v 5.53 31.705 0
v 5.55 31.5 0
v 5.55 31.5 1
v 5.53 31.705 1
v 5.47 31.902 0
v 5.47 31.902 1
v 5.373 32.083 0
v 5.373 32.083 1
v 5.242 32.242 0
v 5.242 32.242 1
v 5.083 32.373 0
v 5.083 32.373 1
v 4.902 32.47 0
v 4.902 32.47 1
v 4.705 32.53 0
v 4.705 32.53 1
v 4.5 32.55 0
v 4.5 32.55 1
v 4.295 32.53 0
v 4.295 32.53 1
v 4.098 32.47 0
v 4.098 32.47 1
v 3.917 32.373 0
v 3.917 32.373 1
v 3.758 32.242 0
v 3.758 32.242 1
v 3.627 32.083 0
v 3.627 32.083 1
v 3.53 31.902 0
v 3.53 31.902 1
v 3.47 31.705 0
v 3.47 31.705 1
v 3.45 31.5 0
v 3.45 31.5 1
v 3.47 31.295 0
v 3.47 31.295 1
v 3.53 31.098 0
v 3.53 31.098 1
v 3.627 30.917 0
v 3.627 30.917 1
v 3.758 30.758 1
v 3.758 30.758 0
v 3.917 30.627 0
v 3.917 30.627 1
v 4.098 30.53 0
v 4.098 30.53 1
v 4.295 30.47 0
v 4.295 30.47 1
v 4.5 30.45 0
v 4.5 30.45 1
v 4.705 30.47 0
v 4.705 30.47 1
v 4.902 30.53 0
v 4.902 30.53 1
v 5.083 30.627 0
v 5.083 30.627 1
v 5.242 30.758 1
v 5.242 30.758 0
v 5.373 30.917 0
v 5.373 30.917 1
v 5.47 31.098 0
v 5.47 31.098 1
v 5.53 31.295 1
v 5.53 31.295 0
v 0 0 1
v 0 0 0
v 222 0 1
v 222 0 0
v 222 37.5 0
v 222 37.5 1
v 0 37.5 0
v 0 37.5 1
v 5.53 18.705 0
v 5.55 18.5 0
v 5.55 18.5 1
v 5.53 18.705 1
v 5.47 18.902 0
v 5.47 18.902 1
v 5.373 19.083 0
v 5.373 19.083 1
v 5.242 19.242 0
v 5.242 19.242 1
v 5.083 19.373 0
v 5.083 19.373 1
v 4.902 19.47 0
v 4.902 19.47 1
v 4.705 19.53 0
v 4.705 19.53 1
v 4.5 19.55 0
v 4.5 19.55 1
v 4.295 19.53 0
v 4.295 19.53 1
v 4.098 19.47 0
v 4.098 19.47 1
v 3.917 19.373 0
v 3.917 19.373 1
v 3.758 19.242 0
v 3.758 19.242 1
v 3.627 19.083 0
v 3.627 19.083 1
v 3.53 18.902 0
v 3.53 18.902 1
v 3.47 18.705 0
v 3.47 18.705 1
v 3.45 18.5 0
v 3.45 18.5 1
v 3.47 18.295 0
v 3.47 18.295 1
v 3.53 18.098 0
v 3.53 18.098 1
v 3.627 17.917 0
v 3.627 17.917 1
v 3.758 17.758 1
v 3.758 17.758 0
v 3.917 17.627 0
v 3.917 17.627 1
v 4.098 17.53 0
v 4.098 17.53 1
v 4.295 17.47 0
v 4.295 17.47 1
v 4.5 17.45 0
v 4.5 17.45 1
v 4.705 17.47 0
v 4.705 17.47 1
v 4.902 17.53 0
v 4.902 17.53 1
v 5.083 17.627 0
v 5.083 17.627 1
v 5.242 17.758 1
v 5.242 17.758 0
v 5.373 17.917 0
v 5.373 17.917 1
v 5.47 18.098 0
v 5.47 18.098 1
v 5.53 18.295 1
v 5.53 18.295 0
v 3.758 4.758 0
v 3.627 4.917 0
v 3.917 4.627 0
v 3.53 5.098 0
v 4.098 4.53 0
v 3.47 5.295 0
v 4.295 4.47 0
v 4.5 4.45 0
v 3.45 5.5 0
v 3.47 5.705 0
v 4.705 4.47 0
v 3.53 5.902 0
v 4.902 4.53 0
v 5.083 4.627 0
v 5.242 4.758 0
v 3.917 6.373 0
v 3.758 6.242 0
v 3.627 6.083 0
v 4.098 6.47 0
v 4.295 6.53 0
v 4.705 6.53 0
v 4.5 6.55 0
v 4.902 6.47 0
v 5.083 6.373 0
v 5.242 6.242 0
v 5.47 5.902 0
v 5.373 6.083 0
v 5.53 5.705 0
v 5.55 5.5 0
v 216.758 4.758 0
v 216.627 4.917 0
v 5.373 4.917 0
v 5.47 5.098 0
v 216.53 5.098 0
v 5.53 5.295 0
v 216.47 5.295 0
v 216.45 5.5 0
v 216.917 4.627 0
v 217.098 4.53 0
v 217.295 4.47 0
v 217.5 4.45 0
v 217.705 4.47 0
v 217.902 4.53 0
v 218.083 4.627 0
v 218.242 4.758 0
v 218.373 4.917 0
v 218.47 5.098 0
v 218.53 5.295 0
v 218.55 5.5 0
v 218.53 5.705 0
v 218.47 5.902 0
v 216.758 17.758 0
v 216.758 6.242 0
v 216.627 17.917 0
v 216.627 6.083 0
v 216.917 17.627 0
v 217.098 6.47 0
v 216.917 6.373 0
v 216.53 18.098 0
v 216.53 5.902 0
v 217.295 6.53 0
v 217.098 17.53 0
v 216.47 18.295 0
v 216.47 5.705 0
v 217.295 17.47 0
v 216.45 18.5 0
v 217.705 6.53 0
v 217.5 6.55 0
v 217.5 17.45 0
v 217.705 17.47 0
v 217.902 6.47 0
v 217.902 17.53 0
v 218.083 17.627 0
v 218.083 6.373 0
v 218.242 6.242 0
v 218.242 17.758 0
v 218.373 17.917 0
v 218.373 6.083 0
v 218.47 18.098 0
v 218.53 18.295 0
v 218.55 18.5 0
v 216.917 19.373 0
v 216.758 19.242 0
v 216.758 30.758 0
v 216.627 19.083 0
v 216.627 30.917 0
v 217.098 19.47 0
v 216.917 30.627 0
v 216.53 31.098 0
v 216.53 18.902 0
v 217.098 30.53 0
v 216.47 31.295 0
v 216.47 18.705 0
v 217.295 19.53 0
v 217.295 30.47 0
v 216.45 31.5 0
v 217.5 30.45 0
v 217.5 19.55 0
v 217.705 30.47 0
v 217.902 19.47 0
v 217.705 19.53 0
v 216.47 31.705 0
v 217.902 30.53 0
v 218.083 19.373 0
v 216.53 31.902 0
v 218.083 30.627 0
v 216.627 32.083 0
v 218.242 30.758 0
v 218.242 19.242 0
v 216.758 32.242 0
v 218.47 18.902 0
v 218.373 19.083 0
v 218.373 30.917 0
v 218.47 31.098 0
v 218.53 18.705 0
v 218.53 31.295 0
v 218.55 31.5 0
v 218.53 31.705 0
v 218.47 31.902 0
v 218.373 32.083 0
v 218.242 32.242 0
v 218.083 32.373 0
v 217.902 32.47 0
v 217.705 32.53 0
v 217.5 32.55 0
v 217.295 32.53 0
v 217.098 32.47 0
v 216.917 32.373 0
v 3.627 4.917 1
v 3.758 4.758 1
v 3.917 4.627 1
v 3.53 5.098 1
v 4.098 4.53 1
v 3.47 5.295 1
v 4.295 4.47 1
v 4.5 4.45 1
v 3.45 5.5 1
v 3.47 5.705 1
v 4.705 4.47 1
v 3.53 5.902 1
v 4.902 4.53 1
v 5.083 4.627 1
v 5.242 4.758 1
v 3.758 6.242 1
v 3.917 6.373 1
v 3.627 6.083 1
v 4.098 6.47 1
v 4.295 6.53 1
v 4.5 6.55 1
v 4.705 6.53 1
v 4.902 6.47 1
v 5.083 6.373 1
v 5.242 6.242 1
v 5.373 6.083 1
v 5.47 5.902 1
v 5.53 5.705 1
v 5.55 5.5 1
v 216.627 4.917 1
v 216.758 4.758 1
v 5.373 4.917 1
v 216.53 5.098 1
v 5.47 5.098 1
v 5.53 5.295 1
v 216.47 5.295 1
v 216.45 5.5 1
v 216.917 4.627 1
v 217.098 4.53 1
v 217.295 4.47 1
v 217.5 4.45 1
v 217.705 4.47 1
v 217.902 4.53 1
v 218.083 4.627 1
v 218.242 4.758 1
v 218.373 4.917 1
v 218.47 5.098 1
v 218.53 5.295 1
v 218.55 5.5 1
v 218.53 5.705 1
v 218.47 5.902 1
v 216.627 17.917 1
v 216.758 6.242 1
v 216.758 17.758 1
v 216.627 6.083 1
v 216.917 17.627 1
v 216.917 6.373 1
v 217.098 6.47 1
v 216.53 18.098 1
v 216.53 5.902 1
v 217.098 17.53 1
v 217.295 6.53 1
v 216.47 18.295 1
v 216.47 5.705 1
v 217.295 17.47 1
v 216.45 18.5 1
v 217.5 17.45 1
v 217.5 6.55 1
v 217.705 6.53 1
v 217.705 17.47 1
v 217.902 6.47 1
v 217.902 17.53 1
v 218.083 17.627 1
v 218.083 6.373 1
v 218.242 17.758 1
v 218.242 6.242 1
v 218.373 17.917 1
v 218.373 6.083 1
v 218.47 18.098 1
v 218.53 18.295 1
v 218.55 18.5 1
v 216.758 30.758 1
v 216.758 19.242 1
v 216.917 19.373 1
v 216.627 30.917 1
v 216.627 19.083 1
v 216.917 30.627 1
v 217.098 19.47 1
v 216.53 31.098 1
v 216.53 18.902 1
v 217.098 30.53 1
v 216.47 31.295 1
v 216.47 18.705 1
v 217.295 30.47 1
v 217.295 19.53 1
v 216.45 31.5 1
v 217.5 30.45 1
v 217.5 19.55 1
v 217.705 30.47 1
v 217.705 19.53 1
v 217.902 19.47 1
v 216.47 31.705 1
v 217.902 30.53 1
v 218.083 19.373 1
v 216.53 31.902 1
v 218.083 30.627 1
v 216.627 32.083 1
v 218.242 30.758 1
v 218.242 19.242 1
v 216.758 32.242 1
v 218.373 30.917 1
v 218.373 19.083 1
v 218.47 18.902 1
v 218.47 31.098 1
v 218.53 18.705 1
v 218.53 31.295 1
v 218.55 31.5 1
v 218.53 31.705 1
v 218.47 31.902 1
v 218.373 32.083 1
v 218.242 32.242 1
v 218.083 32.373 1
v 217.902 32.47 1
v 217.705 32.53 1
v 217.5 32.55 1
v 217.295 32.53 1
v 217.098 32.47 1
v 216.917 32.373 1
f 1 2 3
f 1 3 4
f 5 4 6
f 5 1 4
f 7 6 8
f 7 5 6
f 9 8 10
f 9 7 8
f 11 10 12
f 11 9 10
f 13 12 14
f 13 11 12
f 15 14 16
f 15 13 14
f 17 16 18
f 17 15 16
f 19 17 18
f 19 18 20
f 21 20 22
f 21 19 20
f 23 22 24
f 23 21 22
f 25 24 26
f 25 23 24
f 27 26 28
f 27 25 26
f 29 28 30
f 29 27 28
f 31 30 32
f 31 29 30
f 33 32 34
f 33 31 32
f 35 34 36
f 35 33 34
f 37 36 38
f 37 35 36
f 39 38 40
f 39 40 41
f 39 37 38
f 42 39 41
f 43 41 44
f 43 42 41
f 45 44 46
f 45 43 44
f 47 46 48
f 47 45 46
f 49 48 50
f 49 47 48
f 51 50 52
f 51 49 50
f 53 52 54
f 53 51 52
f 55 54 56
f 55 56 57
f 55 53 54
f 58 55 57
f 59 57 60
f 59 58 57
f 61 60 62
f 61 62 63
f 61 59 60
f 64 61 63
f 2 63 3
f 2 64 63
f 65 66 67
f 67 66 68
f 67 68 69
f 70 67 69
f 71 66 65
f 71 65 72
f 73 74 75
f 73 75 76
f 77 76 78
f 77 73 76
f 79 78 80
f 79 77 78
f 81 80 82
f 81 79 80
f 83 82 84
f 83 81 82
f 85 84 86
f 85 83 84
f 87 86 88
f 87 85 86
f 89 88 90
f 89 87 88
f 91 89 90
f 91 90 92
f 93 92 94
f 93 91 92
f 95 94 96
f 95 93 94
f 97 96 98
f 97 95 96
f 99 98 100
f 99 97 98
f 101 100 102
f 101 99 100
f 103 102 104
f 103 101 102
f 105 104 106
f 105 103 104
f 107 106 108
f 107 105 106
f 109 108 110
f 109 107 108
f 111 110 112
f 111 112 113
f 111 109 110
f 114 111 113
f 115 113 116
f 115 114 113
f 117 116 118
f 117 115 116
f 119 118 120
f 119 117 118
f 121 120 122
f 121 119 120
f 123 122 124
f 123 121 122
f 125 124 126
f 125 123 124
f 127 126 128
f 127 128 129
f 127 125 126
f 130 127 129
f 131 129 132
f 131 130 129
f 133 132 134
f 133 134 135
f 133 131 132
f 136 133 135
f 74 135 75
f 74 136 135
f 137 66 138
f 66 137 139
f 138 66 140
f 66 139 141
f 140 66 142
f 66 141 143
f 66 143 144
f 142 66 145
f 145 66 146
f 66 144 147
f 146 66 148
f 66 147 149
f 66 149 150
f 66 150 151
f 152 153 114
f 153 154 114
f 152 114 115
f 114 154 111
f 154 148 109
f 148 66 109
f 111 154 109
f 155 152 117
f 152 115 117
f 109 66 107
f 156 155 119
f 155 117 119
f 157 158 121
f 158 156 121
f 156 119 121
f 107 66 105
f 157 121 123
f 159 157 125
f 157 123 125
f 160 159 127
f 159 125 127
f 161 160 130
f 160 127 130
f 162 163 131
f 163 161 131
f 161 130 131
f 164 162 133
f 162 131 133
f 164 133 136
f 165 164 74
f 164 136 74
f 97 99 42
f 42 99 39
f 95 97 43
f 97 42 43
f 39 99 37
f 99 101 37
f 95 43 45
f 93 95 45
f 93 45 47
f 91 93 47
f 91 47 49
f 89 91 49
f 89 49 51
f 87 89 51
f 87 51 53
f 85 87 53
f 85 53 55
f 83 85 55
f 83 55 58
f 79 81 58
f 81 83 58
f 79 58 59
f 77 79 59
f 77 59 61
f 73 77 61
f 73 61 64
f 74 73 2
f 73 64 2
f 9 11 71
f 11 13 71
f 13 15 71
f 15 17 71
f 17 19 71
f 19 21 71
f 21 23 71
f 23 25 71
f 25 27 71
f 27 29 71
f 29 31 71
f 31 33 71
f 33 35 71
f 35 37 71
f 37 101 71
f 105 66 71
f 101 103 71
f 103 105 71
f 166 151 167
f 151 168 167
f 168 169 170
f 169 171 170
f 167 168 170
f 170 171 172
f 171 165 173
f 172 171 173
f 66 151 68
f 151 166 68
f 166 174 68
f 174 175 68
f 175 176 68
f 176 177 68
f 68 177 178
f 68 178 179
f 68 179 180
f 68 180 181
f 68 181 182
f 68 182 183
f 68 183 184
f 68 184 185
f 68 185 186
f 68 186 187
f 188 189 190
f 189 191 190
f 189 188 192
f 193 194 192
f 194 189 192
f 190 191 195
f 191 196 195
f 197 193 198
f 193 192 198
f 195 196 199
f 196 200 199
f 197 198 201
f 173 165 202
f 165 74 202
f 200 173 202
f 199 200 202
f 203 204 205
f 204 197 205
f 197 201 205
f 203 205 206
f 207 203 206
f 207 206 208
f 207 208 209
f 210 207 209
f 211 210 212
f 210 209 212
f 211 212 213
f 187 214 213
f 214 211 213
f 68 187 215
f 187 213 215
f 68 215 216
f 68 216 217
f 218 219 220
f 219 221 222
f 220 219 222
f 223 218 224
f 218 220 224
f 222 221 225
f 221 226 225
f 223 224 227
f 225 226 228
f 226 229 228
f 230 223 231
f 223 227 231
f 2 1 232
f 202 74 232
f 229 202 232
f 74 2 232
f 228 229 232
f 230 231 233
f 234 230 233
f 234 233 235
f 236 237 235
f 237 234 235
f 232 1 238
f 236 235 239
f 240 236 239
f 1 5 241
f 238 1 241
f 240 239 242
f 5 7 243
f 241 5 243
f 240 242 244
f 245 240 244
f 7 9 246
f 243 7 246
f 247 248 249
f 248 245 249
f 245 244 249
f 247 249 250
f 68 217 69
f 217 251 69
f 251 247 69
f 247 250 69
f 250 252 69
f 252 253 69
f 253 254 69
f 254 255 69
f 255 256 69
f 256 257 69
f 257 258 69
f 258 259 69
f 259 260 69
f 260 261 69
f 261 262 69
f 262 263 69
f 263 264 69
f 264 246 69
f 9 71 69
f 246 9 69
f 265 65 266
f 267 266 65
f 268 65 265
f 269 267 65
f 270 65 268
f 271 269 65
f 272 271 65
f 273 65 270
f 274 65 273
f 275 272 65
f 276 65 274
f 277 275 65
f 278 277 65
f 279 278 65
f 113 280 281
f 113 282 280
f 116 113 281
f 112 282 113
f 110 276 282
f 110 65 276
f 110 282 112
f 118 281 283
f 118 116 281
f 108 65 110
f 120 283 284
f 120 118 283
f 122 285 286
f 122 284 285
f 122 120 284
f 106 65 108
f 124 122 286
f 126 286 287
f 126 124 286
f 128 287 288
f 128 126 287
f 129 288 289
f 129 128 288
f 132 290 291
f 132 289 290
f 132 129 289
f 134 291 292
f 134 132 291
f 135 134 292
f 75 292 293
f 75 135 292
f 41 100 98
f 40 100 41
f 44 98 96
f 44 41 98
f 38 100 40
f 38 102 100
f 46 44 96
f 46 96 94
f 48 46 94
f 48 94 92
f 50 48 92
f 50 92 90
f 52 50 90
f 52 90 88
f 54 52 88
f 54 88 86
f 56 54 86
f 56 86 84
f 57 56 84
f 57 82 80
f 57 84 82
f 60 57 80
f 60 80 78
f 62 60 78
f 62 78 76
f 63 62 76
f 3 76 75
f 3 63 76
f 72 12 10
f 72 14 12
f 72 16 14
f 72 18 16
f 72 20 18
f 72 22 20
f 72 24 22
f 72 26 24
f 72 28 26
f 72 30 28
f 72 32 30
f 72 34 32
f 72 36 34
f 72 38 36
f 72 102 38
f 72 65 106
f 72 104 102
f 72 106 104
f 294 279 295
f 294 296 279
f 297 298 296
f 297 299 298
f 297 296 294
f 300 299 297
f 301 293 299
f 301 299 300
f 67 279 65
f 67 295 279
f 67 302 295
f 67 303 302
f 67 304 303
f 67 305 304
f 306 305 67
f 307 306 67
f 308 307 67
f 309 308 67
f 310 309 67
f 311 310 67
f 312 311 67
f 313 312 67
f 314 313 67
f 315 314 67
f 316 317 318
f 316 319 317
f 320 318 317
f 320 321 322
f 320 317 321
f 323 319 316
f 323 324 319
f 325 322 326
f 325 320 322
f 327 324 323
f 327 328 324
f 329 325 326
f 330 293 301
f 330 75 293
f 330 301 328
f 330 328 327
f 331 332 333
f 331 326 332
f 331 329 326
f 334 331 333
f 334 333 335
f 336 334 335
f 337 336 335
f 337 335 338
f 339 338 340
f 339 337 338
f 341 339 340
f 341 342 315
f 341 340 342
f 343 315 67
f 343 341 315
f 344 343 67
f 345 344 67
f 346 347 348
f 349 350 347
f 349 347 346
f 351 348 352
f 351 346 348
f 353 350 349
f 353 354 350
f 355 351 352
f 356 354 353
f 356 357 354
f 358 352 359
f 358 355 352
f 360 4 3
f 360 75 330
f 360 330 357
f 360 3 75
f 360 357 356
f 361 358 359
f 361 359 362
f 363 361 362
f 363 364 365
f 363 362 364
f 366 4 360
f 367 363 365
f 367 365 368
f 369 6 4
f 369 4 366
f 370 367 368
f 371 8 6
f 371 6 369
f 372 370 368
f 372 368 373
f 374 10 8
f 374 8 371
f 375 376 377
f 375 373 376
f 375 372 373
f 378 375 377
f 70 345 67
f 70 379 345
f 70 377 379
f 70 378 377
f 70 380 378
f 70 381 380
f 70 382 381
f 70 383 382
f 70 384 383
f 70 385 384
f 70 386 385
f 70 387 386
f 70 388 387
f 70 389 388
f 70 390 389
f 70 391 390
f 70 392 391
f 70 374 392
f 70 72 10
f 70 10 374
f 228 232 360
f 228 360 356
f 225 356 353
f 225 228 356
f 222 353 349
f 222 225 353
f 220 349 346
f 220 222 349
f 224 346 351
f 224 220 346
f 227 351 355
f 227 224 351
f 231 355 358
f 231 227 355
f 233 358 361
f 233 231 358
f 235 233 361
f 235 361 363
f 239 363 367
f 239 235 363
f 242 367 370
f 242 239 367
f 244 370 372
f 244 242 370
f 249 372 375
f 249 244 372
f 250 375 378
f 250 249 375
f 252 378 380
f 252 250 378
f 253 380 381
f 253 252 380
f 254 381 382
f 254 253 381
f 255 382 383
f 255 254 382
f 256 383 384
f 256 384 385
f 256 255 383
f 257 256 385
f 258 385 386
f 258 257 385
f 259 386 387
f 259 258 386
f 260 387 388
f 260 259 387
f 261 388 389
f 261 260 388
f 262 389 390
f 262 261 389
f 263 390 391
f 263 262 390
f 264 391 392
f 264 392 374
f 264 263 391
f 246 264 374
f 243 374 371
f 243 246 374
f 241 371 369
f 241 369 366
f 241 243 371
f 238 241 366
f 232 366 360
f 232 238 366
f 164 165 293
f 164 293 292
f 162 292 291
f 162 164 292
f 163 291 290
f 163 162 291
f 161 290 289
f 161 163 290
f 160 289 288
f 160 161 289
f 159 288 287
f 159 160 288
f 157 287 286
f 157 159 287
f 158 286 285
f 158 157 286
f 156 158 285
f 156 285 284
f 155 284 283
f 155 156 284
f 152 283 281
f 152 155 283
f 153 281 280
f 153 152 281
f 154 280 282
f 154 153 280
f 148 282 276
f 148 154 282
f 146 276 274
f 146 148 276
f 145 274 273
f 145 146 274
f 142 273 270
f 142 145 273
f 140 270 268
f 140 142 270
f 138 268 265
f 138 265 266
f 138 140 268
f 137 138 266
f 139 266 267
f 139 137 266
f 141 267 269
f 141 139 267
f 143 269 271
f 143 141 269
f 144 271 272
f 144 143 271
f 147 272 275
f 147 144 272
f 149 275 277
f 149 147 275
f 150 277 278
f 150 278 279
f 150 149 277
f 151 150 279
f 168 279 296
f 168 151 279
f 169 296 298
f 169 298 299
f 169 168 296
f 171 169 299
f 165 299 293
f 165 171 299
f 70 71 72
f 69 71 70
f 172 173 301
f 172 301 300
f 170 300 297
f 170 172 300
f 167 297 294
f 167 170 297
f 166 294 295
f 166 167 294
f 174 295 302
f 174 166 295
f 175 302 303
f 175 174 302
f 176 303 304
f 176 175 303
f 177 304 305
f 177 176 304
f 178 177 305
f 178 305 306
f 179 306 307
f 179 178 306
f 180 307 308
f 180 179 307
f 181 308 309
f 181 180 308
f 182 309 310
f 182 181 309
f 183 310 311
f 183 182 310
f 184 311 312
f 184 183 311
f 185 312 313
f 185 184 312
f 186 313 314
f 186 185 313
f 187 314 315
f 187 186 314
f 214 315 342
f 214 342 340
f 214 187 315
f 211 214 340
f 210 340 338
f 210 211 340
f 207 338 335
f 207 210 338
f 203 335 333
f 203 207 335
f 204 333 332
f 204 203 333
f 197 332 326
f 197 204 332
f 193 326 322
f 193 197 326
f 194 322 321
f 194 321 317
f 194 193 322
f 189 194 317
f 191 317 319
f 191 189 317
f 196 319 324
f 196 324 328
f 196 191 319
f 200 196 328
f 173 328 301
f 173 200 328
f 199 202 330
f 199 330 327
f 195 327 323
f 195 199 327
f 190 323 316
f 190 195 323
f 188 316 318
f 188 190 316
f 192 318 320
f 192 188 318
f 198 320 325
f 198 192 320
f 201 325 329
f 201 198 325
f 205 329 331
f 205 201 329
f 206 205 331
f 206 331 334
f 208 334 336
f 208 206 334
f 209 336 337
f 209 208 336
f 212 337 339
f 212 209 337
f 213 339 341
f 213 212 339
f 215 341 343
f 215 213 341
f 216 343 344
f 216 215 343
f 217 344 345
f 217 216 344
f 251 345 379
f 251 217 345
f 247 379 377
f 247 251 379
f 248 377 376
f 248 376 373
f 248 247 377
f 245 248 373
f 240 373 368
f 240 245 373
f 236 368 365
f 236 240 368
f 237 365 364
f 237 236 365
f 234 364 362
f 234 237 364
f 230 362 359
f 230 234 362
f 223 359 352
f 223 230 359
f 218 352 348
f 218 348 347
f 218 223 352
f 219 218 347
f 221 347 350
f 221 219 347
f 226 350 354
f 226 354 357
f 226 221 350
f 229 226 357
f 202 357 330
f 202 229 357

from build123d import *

# Parameters (mm, degrees)
SKETCH_1_W      = 222
SKETCH_1_H      = 37.5
SKETCH_1_R      = 1.05
EXTRUDE_1_DEPTH = 1


with BuildPart() as part:
    # Эскиз1 → Бобышка-Вытянуть1 (new body)
    with BuildSketch(Plane.XY):
        with Locations((111, 18.75)):
            Rectangle(SKETCH_1_W, SKETCH_1_H)
        with Locations((4.5, 31.5)):
            Circle(SKETCH_1_R, mode=Mode.SUBTRACT)
        with Locations((4.5, 18.5)):
            Circle(SKETCH_1_R, mode=Mode.SUBTRACT)
        with Locations((4.5, 5.5)):
            Circle(SKETCH_1_R, mode=Mode.SUBTRACT)
        with Locations(Location((217.5, 5.5, 0), (0, 0, 180))):
            Circle(SKETCH_1_R, mode=Mode.SUBTRACT)
        with Locations(Location((217.5, 18.5, 0), (0, 0, 180))):
            Circle(SKETCH_1_R, mode=Mode.SUBTRACT)
        with Locations(Location((217.5, 31.5, 0), (0, 0, 180))):
            Circle(SKETCH_1_R, mode=Mode.SUBTRACT)
    extrude(amount=EXTRUDE_1_DEPTH)


solid = part.part
